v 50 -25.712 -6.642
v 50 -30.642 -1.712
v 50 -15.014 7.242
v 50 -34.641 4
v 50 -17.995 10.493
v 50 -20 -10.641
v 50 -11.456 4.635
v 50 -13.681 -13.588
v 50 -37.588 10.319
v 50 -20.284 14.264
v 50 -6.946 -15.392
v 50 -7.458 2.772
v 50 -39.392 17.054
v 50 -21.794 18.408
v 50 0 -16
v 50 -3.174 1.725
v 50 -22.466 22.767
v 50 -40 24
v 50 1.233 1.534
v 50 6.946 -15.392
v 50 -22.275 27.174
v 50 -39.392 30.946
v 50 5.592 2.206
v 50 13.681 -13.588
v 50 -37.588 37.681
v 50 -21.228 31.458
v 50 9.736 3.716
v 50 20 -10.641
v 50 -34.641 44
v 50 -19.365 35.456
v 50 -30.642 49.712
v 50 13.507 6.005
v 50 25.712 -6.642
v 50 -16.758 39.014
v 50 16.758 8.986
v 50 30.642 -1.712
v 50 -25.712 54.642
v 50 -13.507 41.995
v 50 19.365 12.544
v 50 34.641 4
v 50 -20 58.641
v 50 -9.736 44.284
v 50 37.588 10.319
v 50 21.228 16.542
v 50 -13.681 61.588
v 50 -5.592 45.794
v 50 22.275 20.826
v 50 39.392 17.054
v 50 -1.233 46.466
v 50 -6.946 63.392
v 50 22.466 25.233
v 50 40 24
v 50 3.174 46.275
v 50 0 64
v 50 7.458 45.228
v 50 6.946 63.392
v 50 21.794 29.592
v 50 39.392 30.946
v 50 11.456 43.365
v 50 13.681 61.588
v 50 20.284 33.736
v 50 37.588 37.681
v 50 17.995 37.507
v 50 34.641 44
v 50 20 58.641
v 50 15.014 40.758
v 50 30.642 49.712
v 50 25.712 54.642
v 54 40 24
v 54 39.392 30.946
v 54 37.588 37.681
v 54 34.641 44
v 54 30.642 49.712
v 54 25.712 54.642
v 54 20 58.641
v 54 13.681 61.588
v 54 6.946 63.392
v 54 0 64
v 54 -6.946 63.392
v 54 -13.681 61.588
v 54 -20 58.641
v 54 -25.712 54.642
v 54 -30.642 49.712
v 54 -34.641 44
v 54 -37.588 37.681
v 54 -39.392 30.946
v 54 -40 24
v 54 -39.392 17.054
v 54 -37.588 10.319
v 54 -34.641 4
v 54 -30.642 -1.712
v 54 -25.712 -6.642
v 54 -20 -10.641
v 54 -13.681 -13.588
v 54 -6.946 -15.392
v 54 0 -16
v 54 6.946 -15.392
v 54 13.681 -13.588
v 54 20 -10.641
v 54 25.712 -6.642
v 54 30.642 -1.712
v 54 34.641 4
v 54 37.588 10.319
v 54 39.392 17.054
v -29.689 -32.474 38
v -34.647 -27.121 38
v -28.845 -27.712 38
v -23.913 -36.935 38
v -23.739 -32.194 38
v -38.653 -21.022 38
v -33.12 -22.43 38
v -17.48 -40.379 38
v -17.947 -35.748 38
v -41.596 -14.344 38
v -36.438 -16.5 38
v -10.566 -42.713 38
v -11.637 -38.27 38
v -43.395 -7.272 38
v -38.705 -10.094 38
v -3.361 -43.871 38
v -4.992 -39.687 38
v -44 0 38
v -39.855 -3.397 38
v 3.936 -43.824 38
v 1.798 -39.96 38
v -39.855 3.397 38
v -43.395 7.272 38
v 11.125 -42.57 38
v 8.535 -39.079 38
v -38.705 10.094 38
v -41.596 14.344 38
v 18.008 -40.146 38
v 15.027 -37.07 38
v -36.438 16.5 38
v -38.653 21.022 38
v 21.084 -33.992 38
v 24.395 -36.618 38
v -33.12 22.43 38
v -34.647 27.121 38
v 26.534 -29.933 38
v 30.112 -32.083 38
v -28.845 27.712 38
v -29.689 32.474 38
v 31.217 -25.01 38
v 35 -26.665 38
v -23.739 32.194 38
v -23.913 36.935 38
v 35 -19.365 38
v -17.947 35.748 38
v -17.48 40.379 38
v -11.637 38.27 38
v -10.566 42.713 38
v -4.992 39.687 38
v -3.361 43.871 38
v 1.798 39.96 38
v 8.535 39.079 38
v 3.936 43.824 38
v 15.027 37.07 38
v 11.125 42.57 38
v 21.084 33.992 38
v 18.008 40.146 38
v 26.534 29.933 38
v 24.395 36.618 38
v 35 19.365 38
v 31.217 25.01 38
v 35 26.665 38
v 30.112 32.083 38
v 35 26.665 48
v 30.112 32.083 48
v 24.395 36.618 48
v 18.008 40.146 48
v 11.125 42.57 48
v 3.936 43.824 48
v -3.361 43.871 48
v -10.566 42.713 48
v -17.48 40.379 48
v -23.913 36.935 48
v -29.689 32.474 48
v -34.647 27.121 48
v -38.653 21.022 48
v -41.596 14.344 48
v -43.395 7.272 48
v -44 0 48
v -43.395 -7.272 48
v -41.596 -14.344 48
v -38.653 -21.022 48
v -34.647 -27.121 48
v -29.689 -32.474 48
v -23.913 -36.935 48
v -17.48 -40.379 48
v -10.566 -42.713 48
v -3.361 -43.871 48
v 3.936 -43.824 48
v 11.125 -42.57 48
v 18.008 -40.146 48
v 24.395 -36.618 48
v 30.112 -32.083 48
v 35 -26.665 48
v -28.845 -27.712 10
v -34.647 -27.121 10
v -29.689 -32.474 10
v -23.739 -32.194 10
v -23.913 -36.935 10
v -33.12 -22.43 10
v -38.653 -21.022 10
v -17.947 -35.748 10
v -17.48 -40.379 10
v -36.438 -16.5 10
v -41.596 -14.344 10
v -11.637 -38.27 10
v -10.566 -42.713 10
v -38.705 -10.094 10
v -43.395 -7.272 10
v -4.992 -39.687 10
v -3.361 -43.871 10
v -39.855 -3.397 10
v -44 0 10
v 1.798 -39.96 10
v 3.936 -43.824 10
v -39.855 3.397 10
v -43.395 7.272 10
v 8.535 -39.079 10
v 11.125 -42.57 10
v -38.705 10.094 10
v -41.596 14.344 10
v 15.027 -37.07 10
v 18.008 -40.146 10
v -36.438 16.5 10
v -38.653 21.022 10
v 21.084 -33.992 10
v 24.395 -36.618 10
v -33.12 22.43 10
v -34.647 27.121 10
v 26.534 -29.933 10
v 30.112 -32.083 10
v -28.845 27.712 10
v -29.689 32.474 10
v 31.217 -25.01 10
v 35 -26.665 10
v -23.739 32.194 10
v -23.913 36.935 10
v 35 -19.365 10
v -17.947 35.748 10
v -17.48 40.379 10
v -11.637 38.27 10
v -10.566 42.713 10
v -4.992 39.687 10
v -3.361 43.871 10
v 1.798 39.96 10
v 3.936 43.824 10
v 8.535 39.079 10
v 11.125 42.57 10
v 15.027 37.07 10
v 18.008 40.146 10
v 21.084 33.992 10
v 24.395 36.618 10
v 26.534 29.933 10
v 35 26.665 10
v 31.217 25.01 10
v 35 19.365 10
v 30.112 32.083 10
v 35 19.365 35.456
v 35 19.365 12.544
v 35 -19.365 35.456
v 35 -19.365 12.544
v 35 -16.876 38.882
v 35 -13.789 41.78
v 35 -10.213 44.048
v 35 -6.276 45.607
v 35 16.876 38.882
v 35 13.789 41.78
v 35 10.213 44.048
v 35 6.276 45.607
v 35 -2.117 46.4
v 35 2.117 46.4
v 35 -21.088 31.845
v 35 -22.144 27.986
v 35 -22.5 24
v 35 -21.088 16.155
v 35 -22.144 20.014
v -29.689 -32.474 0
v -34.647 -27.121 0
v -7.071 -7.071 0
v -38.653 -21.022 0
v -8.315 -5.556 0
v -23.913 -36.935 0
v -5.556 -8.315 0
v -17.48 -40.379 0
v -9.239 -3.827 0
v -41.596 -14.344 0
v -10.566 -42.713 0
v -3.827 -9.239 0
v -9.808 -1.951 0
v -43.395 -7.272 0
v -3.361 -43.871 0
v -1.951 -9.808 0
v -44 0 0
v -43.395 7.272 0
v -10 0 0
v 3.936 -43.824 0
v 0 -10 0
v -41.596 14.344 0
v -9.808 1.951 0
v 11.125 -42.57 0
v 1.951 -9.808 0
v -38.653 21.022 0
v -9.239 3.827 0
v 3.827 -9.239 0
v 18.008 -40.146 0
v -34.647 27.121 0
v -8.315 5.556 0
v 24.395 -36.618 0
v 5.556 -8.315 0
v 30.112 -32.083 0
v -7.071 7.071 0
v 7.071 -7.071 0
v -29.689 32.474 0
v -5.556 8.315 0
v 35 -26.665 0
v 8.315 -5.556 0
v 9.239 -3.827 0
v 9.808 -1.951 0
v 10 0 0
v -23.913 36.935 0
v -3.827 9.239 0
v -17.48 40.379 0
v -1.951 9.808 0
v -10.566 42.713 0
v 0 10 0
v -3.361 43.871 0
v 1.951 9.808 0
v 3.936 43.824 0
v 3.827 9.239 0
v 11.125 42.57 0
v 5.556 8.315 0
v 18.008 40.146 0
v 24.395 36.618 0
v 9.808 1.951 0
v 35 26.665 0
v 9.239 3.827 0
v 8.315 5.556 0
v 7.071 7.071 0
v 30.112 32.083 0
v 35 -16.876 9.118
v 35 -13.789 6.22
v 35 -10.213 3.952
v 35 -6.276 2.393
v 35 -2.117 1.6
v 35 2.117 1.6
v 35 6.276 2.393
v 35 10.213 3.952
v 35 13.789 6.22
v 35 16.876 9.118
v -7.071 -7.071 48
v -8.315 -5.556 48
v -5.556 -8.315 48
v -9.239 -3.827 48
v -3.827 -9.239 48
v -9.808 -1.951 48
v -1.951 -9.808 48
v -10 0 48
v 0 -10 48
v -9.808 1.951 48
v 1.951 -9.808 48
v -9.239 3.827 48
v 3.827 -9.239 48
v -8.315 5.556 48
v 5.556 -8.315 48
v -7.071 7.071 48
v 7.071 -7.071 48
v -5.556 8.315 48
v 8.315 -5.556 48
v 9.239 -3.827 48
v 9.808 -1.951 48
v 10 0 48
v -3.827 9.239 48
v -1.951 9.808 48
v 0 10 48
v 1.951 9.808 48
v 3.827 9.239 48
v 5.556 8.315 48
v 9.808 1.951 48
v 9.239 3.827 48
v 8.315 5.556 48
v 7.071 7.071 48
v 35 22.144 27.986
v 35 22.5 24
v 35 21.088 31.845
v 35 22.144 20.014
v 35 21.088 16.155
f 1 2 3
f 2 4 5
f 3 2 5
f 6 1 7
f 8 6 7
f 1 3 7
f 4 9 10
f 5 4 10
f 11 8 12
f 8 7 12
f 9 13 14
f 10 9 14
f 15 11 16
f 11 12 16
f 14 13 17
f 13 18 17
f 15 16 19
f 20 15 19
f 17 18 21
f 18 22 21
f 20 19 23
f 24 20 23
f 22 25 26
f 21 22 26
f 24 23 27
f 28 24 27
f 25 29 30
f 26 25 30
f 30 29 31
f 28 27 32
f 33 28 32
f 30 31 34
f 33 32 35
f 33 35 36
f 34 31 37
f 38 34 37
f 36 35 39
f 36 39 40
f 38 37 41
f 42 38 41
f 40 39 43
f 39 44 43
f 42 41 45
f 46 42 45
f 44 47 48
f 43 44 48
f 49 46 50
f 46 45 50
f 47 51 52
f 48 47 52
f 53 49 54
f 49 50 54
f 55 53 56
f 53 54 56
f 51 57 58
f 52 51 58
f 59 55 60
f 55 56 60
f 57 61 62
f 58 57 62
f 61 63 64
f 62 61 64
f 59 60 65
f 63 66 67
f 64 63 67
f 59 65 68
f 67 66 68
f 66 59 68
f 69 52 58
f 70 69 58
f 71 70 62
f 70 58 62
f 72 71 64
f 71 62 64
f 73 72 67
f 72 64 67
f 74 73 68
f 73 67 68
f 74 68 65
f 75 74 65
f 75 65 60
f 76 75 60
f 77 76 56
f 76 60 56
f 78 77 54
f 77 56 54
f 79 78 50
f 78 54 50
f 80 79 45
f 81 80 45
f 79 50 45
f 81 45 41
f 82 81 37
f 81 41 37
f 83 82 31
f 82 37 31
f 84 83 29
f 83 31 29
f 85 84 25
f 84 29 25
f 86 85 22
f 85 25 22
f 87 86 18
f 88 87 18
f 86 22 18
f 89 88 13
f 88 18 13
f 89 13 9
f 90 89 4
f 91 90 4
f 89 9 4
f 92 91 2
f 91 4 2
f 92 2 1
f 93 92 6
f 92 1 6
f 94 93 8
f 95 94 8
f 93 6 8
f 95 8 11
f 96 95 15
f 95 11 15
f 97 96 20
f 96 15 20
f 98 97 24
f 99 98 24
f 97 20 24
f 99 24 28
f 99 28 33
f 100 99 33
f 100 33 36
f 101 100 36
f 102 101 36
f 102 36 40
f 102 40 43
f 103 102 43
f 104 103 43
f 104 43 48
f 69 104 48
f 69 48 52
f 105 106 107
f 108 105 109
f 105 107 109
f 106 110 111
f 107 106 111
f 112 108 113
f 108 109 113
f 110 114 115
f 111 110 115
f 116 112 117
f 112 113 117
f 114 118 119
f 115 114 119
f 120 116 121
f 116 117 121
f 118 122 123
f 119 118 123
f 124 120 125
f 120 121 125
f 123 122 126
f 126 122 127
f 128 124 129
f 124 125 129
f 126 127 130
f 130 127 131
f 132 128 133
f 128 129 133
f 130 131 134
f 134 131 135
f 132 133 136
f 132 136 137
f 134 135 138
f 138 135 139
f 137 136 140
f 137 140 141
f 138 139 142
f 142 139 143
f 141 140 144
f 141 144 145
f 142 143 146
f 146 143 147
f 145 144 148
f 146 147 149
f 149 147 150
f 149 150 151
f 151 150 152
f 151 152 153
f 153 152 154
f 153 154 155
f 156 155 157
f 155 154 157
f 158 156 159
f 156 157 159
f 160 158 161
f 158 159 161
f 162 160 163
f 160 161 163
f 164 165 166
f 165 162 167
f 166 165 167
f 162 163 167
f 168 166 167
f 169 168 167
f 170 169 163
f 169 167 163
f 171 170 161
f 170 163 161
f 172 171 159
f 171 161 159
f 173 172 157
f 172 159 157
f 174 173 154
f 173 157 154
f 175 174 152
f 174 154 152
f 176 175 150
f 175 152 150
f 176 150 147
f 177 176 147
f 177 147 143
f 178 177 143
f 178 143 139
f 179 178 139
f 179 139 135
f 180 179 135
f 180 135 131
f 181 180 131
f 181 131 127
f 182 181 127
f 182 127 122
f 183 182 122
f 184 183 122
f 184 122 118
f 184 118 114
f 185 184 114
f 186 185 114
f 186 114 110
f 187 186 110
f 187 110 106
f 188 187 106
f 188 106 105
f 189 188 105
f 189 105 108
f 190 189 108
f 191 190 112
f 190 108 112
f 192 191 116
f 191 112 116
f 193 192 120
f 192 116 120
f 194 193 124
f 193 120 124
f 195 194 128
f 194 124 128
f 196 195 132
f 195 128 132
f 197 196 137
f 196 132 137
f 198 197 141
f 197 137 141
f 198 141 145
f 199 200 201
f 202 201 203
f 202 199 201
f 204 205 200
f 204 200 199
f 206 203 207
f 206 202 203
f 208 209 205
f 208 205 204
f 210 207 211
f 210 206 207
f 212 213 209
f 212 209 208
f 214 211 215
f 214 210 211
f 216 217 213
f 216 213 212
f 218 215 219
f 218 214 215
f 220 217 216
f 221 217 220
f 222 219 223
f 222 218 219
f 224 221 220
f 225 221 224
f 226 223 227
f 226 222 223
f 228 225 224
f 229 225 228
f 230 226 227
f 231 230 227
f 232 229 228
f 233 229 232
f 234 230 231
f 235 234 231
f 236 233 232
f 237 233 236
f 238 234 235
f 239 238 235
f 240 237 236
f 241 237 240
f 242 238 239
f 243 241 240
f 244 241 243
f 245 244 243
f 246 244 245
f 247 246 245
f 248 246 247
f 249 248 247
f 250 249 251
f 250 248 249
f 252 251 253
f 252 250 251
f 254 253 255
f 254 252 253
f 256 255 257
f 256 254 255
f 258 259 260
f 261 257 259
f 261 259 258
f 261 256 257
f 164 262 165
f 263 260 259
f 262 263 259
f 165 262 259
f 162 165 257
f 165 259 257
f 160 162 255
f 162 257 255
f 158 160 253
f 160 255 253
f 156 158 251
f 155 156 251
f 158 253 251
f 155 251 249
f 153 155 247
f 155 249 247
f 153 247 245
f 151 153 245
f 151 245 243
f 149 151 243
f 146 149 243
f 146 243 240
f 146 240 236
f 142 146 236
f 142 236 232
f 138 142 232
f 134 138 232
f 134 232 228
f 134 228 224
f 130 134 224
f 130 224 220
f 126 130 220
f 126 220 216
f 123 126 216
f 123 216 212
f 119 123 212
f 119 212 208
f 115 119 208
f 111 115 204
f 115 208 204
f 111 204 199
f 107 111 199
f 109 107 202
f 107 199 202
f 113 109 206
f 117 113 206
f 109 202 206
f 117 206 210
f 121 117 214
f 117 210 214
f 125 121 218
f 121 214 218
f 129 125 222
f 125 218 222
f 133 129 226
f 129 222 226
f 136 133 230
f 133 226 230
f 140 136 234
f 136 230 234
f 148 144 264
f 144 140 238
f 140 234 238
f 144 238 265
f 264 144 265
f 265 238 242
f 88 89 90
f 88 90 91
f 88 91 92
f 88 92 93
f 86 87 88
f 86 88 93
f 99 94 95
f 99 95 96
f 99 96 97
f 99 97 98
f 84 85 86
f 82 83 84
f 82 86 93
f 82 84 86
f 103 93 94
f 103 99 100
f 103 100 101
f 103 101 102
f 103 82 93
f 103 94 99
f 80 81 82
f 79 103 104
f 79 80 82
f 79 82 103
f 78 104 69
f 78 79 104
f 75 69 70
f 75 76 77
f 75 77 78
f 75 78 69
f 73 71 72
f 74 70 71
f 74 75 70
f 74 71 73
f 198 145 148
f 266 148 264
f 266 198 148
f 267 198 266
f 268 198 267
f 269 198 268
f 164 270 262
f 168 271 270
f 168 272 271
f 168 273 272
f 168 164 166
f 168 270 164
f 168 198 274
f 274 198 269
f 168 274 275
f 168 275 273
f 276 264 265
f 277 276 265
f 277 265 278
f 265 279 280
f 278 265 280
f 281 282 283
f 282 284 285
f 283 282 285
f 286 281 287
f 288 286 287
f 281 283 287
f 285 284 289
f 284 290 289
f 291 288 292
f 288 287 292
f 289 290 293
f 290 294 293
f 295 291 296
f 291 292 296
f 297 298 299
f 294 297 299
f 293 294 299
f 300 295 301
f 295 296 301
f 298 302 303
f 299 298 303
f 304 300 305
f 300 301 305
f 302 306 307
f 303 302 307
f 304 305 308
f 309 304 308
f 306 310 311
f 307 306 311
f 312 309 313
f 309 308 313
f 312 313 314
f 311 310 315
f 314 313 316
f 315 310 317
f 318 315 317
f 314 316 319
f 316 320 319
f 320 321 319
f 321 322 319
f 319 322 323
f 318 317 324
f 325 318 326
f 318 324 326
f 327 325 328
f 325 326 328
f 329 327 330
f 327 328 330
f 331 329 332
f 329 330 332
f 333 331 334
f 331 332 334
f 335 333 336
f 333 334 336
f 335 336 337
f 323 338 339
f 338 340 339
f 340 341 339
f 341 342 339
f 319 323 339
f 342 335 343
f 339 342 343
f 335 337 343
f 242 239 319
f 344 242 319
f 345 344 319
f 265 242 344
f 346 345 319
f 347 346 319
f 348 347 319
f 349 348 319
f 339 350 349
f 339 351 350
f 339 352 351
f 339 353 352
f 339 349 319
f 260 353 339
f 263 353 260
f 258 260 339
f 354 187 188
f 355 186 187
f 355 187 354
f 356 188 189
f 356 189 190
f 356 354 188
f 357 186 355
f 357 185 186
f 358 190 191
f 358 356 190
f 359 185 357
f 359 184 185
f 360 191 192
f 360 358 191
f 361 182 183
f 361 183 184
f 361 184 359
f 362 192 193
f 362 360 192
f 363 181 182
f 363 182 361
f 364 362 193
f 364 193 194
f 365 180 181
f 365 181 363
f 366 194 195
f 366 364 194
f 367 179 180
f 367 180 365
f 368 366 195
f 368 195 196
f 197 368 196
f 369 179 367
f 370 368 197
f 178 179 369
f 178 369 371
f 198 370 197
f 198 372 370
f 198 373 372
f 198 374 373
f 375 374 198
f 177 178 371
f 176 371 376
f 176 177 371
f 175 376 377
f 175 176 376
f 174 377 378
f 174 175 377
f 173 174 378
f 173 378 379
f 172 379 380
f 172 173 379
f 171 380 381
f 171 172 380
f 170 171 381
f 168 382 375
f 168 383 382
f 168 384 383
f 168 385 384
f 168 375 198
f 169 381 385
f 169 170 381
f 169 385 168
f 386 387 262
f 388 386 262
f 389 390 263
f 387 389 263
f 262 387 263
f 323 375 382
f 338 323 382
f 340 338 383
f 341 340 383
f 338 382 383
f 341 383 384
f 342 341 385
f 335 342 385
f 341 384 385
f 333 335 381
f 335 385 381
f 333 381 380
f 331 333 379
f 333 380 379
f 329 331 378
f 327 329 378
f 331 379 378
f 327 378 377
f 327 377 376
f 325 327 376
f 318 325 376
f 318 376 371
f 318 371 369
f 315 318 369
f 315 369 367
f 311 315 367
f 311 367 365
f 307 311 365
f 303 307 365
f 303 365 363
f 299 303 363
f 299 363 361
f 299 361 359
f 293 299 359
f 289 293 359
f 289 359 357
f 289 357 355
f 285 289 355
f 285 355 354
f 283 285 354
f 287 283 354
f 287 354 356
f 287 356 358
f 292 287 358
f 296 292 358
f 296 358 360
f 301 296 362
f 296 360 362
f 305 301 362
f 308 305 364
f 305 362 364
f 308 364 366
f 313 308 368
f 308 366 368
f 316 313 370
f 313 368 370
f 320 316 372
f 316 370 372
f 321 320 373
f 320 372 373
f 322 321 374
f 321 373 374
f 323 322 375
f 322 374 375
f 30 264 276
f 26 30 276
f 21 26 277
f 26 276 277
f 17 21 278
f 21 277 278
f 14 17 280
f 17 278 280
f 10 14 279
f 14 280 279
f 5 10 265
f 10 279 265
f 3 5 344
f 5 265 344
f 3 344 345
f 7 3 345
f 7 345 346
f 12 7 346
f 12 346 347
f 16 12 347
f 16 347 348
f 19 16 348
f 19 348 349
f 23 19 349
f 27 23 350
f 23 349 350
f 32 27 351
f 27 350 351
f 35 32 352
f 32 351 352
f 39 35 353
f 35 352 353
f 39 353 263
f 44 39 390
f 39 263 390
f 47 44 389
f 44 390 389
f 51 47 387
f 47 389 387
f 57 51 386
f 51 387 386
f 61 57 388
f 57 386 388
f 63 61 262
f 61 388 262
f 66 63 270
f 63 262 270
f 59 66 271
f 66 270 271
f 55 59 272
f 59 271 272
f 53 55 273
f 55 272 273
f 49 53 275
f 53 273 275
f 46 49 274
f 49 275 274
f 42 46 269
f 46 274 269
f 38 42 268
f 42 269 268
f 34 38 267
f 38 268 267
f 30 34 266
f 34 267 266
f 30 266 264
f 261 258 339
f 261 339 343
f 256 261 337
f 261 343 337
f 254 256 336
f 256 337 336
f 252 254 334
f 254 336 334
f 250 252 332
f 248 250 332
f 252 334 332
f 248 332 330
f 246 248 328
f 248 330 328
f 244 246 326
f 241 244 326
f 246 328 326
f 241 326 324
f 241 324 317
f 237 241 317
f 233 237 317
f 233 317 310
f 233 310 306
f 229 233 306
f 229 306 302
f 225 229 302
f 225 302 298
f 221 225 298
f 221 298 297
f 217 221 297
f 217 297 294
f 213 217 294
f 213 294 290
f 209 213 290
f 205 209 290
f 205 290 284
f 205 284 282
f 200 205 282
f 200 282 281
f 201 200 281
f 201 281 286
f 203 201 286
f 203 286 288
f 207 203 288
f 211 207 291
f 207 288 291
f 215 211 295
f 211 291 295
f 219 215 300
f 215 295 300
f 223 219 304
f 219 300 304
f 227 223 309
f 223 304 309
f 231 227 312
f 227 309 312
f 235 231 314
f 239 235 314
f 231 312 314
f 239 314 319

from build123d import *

# Parameters (mm, degrees)
ESQUISSE1_R             = 44
BOSS_EXTRU_1_DEPTH      = 10
ESQUISSE2_R             = 40
BOSS_EXTRU_2_DEPTH      = 28
ESQUISSE3_R             = 44
BOSS_EXTRU_3_DEPTH      = 10
ESQUISSE5_W             = 32.472445712
ESQUISSE5_H             = 94.731646138
ENL_V_MAT_EXTRU_2_DEPTH = 79.587530818
ESQUISSE4_R             = 10
ENL_V_MAT_EXTRU_1_DEPTH = 79.587530818
SKETCH1_R               = 22.5
BOSS_EXTRUDE1_DEPTH     = 15
SKETCH2_R               = 40
BOSS_EXTRUDE2_DEPTH     = 4


with BuildPart() as part:
    # Esquisse1 → Boss.-Extru.1 (new body)
    with BuildSketch(Plane.XY):
        Circle(ESQUISSE1_R)
    extrude(amount=BOSS_EXTRU_1_DEPTH)

    # Esquisse2 → Boss.-Extru.2 (add)
    with BuildSketch(Plane.XY.offset(10)):
        Circle(ESQUISSE2_R)
    extrude(amount=BOSS_EXTRU_2_DEPTH)

    # Esquisse3 → Boss.-Extru.3 (add)
    with BuildSketch(Plane.XY.offset(38)):
        Circle(ESQUISSE3_R)
    extrude(amount=BOSS_EXTRU_3_DEPTH)

    # Esquisse5 → Enlèv. mat.-Extru.2 (cut, through all)
    with BuildSketch(Plane.XY.offset(48)):
        with Locations((51.236222856, -3.296075317)):
            Rectangle(ESQUISSE5_W, ESQUISSE5_H)
    extrude(amount=-ENL_V_MAT_EXTRU_2_DEPTH, mode=Mode.SUBTRACT)

    # Esquisse4 → Enlèv. mat.-Extru.1 (cut, through all)
    with BuildSketch(Plane.XY.offset(48)):
        Circle(ESQUISSE4_R)
    extrude(amount=-ENL_V_MAT_EXTRU_1_DEPTH, mode=Mode.SUBTRACT)

    # Sketch1 → Boss-Extrude1 (add)
    with BuildSketch(Plane(origin=(35, 0, 0), x_dir=(0, 0, -1), z_dir=(1, 0, 0))):
        with Locations(Location((-24, 0, 0), (0, 0, 239.39110234))):
            Circle(SKETCH1_R)
    extrude(amount=BOSS_EXTRUDE1_DEPTH)

    # Sketch2 → Boss-Extrude2 (add)
    with BuildSketch(Plane(origin=(50, 0, 0), x_dir=(0, 0, -1), z_dir=(1, 0, 0))):
        with Locations(Location((-24, 0, 0), (0, 0, 90))):
            Circle(SKETCH2_R)
    extrude(amount=BOSS_EXTRUDE2_DEPTH)


solid = part.part
